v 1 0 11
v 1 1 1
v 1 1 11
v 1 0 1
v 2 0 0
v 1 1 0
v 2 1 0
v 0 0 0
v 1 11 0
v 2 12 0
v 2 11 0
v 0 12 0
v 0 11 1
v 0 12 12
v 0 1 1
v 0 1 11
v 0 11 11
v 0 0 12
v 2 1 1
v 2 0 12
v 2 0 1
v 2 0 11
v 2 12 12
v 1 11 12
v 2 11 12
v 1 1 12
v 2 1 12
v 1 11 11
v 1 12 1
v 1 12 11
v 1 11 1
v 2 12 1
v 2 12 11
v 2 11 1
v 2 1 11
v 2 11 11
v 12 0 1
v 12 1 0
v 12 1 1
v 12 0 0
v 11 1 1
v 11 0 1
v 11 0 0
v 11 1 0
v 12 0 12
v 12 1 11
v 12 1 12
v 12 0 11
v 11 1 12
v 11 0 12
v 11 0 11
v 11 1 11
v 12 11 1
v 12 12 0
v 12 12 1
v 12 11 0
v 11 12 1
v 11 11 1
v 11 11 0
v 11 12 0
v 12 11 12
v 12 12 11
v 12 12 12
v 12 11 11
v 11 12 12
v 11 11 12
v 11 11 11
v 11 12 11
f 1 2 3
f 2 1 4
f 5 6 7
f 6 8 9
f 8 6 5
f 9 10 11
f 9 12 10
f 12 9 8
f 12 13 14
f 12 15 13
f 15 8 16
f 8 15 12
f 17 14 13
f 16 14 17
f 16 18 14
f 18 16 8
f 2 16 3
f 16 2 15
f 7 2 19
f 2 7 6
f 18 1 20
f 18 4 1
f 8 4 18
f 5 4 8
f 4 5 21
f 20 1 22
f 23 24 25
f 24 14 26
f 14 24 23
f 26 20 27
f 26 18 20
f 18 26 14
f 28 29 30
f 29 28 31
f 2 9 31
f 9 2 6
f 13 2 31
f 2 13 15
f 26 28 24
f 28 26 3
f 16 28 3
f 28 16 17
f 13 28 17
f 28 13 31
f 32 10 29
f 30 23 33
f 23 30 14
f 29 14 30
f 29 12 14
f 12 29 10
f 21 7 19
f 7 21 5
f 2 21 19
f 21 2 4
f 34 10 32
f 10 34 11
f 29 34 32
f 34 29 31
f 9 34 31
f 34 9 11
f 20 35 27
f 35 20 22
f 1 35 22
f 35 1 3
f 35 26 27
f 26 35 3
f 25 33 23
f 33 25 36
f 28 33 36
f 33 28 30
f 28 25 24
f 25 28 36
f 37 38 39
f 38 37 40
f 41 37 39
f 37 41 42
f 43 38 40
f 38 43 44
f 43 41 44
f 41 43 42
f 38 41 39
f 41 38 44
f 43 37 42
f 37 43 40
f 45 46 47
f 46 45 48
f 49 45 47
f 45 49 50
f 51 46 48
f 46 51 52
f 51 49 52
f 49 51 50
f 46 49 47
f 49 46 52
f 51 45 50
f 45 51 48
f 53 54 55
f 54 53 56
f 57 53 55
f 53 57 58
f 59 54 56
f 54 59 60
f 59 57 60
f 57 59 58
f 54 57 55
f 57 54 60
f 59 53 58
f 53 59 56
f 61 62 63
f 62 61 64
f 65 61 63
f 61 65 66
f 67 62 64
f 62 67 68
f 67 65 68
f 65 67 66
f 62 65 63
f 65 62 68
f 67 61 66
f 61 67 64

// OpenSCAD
union() {
    translate([0.0, 0.0, 0.0]) cube([1, 1, 1]);
    translate([0.0, 0.0, 1.0]) cube([1, 1, 1]);
    translate([0.0, 0.0, 2.0]) cube([1, 1, 1]);
    translate([0.0, 0.0, 3.0]) cube([1, 1, 1]);
    translate([0.0, 0.0, 4.0]) cube([1, 1, 1]);
    translate([0.0, 0.0, 5.0]) cube([1, 1, 1]);
    translate([0.0, 0.0, 6.0]) cube([1, 1, 1]);
    translate([0.0, 0.0, 7.0]) cube([1, 1, 1]);
    translate([0.0, 0.0, 8.0]) cube([1, 1, 1]);
    translate([0.0, 0.0, 9.0]) cube([1, 1, 1]);
    translate([0.0, 0.0, 10.0]) cube([1, 1, 1]);
    translate([0.0, 0.0, 11.0]) cube([1, 1, 1]);
    translate([0.0, 1.0, 0.0]) cube([1, 1, 1]);
    translate([0.0, 1.0, 11.0]) cube([1, 1, 1]);
    translate([0.0, 2.0, 0.0]) cube([1, 1, 1]);
    translate([0.0, 2.0, 11.0]) cube([1, 1, 1]);
    translate([0.0, 3.0, 0.0]) cube([1, 1, 1]);
    translate([0.0, 3.0, 11.0]) cube([1, 1, 1]);
    translate([0.0, 4.0, 0.0]) cube([1, 1, 1]);
    translate([0.0, 4.0, 11.0]) cube([1, 1, 1]);
    translate([0.0, 5.0, 0.0]) cube([1, 1, 1]);
    translate([0.0, 5.0, 11.0]) cube([1, 1, 1]);
    translate([0.0, 6.0, 0.0]) cube([1, 1, 1]);
    translate([0.0, 6.0, 11.0]) cube([1, 1, 1]);
    translate([0.0, 7.0, 0.0]) cube([1, 1, 1]);
    translate([0.0, 7.0, 11.0]) cube([1, 1, 1]);
    translate([0.0, 8.0, 0.0]) cube([1, 1, 1]);
    translate([0.0, 8.0, 11.0]) cube([1, 1, 1]);
    translate([0.0, 9.0, 0.0]) cube([1, 1, 1]);
    translate([0.0, 9.0, 11.0]) cube([1, 1, 1]);
    translate([0.0, 10.0, 0.0]) cube([1, 1, 1]);
    translate([0.0, 10.0, 11.0]) cube([1, 1, 1]);
    translate([0.0, 11.0, 0.0]) cube([1, 1, 1]);
    translate([0.0, 11.0, 1.0]) cube([1, 1, 1]);
    translate([0.0, 11.0, 2.0]) cube([1, 1, 1]);
    translate([0.0, 11.0, 3.0]) cube([1, 1, 1]);
    translate([0.0, 11.0, 4.0]) cube([1, 1, 1]);
    translate([0.0, 11.0, 5.0]) cube([1, 1, 1]);
    translate([0.0, 11.0, 6.0]) cube([1, 1, 1]);
    translate([0.0, 11.0, 7.0]) cube([1, 1, 1]);
    translate([0.0, 11.0, 8.0]) cube([1, 1, 1]);
    translate([0.0, 11.0, 9.0]) cube([1, 1, 1]);
    translate([0.0, 11.0, 10.0]) cube([1, 1, 1]);
    translate([0.0, 11.0, 11.0]) cube([1, 1, 1]);
    translate([1.0, 0.0, 0.0]) cube([1, 1, 1]);
    translate([1.0, 11.0, 0.0]) cube([1, 1, 1]);
    translate([1.0, 0.0, 11.0]) cube([1, 1, 1]);
    translate([1.0, 11.0, 11.0]) cube([1, 1, 1]);
    translate([11.0, 0.0, 0.0]) cube([1, 1, 1]);
    translate([11.0, 0.0, 11.0]) cube([1, 1, 1]);
    translate([11.0, 11.0, 0.0]) cube([1, 1, 1]);
    translate([11.0, 11.0, 11.0]) cube([1, 1, 1]);
}
